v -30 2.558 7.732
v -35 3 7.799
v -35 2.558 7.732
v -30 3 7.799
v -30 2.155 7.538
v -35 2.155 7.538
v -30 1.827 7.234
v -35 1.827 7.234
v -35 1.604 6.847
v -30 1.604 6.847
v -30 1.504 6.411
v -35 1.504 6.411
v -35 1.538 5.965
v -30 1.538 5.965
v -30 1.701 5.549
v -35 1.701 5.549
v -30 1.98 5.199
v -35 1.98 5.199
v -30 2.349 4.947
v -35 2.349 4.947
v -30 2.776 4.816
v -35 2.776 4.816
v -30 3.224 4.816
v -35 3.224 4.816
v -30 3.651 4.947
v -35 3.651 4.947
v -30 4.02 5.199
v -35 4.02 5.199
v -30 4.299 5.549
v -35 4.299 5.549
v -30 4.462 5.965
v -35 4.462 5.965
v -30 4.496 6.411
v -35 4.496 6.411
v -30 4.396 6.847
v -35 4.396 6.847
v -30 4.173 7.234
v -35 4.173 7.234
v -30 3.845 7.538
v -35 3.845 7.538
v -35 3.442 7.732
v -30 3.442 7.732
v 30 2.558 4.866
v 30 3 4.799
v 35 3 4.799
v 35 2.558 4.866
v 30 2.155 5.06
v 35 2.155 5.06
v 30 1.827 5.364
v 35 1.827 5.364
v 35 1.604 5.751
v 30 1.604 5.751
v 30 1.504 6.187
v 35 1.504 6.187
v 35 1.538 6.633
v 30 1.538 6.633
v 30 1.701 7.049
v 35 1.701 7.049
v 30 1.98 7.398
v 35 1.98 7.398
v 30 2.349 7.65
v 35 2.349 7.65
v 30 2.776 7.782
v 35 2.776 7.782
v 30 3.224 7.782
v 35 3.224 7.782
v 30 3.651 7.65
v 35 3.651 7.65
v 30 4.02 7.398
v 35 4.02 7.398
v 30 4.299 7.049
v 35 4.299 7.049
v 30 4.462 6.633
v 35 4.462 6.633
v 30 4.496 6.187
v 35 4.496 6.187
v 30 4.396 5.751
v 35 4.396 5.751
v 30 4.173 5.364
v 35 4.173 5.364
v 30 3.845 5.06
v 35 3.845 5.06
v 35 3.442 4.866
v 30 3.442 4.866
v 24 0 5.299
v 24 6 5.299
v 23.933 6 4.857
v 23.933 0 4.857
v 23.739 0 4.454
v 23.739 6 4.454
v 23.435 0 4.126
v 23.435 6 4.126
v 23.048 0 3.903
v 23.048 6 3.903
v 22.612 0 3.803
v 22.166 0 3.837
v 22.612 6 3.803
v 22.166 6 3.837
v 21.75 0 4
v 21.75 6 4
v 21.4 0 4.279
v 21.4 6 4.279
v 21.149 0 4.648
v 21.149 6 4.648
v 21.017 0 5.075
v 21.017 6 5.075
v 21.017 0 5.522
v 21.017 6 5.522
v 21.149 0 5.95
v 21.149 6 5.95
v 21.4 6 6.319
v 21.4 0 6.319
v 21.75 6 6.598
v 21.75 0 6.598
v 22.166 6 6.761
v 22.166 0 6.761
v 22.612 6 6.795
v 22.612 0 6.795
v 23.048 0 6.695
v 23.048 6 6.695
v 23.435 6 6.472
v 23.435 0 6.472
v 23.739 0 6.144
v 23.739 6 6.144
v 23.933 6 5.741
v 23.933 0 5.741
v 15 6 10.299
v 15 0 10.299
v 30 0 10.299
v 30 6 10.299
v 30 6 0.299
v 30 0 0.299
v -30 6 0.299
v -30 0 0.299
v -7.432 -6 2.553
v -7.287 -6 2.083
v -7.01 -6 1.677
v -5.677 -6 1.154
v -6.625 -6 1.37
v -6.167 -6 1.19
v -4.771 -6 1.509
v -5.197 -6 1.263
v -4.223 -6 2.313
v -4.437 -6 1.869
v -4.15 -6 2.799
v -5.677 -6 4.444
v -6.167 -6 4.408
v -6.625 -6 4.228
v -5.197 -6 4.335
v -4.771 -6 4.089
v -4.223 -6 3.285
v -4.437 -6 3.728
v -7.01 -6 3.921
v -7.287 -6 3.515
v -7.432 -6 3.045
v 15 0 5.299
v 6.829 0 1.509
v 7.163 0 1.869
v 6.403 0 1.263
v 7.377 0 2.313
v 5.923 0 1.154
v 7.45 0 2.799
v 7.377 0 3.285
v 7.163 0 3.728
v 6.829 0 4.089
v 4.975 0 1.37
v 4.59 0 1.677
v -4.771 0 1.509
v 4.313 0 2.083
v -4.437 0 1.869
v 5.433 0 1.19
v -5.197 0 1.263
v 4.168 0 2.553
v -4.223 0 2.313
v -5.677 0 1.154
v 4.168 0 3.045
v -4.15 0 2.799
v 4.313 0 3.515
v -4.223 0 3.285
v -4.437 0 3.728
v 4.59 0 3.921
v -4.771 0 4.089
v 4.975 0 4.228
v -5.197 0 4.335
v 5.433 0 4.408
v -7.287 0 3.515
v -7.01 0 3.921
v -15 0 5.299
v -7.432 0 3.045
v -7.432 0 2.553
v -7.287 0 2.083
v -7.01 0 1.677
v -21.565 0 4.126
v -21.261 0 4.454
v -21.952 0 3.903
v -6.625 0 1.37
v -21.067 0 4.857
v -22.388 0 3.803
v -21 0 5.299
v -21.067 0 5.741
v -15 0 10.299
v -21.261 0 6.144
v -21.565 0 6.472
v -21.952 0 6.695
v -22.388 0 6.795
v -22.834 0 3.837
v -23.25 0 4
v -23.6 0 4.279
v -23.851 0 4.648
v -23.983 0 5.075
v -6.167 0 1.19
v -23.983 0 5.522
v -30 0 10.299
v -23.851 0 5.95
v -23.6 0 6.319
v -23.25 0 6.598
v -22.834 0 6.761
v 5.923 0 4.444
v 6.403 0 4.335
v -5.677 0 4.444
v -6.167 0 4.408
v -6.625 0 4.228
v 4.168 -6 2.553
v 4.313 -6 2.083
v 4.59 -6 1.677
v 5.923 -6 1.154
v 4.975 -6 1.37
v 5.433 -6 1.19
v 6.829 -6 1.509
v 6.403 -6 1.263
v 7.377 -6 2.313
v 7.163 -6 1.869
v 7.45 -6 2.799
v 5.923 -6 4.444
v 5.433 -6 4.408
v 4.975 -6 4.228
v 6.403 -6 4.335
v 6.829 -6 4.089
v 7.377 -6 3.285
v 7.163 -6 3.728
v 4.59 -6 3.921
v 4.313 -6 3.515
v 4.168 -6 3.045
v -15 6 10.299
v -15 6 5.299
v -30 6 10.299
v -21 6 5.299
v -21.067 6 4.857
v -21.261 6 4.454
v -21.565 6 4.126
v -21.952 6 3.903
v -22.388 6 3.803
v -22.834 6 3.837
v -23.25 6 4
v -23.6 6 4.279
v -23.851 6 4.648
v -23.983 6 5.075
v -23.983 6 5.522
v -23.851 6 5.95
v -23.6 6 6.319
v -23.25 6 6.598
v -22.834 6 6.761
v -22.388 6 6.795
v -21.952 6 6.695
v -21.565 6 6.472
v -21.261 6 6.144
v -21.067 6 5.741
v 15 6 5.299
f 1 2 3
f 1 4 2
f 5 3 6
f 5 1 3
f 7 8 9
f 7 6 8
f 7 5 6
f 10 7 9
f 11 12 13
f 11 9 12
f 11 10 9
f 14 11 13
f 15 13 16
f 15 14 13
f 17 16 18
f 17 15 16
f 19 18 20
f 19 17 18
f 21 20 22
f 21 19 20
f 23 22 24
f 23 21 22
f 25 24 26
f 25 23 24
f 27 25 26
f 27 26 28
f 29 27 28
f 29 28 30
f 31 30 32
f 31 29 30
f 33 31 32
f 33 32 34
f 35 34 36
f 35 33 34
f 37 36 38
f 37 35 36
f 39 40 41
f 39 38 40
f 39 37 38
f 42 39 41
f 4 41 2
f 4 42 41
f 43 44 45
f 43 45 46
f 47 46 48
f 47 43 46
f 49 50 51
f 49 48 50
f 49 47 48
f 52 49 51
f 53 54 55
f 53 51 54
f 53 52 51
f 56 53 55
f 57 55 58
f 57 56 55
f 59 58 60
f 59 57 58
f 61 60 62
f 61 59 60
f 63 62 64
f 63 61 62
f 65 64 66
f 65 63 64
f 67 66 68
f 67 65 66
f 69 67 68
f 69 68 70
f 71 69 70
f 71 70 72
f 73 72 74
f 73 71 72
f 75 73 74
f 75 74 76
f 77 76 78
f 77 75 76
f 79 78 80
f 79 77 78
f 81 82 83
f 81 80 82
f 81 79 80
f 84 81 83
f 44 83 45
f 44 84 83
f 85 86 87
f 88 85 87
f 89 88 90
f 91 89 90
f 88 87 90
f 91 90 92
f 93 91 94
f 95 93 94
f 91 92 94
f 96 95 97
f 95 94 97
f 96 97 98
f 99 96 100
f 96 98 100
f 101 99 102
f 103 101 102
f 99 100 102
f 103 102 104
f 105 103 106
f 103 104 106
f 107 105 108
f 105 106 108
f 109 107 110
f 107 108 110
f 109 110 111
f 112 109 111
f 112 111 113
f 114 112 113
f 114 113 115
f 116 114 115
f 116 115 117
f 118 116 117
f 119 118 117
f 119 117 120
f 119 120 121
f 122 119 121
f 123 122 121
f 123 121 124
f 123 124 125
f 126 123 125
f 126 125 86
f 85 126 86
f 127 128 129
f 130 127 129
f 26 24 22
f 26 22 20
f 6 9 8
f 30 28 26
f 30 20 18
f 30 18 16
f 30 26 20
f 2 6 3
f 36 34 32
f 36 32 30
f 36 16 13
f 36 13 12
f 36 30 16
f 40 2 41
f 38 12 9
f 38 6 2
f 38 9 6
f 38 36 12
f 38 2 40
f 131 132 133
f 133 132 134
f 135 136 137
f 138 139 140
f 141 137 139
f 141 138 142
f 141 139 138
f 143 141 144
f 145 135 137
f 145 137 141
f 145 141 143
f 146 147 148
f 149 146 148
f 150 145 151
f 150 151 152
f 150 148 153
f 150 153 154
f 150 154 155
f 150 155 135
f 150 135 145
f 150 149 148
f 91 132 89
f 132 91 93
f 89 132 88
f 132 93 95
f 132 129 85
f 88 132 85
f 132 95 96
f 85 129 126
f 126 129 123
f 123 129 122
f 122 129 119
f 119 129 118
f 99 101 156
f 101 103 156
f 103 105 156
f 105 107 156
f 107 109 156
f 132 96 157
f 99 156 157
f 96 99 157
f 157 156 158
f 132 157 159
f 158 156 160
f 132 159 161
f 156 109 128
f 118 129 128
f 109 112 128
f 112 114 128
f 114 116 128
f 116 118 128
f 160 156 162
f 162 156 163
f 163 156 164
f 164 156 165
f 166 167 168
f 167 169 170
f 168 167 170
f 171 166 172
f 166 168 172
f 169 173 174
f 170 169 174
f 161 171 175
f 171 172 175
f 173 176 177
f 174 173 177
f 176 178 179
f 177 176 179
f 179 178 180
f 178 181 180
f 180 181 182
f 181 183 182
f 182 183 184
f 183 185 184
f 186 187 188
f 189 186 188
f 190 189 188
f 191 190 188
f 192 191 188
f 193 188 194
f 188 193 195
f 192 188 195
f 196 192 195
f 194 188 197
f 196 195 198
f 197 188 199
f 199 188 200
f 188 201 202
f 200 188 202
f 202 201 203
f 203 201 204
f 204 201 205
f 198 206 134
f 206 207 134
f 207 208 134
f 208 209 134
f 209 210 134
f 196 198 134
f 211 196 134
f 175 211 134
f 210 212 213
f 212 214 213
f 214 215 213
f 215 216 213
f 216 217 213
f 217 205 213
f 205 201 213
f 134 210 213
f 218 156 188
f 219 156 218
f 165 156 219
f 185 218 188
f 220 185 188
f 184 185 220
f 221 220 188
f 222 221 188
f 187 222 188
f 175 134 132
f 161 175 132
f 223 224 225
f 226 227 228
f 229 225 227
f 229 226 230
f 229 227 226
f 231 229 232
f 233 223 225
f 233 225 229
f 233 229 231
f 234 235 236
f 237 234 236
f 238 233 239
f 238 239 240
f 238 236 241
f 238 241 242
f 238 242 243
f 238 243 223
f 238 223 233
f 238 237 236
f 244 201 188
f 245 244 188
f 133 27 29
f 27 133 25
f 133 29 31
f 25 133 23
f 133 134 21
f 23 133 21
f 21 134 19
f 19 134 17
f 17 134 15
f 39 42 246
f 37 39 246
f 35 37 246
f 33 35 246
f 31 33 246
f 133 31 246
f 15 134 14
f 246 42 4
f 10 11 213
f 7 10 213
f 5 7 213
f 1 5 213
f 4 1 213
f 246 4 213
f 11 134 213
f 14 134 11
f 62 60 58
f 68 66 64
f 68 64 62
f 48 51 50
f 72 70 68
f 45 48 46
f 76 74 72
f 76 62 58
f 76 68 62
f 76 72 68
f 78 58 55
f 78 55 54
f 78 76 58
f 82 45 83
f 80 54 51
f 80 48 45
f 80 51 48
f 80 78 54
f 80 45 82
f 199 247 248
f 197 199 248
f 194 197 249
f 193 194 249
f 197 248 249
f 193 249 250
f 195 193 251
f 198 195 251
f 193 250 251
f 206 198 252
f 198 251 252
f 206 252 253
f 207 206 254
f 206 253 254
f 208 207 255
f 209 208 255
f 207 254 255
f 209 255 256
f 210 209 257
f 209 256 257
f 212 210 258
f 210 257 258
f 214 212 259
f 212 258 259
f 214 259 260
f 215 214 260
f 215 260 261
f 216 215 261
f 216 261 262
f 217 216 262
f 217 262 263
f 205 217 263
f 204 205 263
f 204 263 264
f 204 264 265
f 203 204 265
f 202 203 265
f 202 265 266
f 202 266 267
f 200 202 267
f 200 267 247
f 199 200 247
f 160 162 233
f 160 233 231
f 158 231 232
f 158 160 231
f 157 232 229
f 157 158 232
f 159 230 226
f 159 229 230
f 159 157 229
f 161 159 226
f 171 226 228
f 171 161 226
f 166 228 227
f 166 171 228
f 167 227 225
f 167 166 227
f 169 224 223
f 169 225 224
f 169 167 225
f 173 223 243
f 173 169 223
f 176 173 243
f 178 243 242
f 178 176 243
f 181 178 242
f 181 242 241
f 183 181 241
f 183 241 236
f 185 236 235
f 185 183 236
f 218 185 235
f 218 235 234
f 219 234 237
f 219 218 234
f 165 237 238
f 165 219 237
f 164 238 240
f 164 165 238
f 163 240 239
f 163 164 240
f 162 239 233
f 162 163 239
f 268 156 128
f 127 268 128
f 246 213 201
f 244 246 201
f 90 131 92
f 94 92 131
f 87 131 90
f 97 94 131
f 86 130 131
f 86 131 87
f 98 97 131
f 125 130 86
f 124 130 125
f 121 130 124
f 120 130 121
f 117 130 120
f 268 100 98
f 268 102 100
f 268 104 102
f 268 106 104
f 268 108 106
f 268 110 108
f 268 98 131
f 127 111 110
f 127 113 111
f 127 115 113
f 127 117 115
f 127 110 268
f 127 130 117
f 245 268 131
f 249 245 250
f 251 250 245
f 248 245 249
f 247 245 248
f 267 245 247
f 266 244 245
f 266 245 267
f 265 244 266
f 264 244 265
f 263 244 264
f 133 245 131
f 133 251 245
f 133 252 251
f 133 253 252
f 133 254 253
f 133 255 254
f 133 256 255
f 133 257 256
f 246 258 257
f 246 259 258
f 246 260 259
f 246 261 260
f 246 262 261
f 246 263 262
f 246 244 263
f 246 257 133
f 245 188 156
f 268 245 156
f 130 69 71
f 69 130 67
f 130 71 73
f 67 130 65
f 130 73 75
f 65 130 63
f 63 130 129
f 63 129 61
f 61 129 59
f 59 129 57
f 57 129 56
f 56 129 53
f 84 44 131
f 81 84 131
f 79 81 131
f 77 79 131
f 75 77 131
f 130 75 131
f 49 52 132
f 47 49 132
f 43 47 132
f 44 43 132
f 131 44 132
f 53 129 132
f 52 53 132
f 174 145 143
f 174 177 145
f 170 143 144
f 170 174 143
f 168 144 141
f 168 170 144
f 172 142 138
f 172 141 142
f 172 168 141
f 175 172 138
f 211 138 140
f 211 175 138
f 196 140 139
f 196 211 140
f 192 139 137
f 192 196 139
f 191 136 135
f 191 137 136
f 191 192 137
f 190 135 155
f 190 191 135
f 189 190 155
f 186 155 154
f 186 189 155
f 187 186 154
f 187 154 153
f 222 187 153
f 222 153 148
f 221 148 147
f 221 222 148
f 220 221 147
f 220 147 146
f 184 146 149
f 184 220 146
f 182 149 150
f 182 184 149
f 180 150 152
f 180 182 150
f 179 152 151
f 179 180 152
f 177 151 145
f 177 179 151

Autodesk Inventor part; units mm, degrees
ref_plane "YZ Plane" through (0, 0, 0) normal (1, 0, 0) x (0, 1, 0)
ref_plane "XZ Plane" through (0, 0, 0) normal (0, 1, 0) x (-1, 0, 0)
ref_plane "XY Plane" through (0, 0, 0) normal (0, 0, 1) x (1, 0, 0)
sketch "Skizze1" plane through (0, 0, 0) normal (0, 1, 0) x (-1, 0, 0)
  line L0 (30, 0.2989) -> (30, 10.2989)
  line L1 (30, 10.2989) -> (15, 10.2989)
  line L2 (15, 10.2989) -> (15, 5.2989)
  line L3 (15, 5.2989) -> (-15, 5.2989)
  line L4 (-15, 5.2989) -> (-15, 10.2989)
  line L5 (-15, 10.2989) -> (-30, 10.2989)
  line L6 (-30, 10.2989) -> (-30, 0.2989)
  line L7 (-30, 0.2989) -> (30, 0.2989)
  line L8 (0, -2.0598) -> (0, 12.3587) projected
  point P0 (0, 0)
  dimension "d0" = 30
  dimension "d1" = 5
  dimension "d2" = 15
  dimension "d3" = 15
  dimension "d4" = 15
  dimension "d5" = 5
extrude "Extrusion1" add sketch "Skizze1" along normal blind 6
sketch "Skizze2" plane through (30, 0, 10.2989) normal (1, 0, 0) x (0, 0, -1)
  circle A0 centre (4, 3) radius 1.5
  line L0 (0, 0) -> (0, 6) projected
  line L1 (0, 6) -> (10, 6) projected
  point P0 (10.2989, 0)
  dimension "d8" = 3
  dimension "d9" = 4
  dimension "d10" = 3
extrude "Extrusion2" add sketch "Skizze2" along normal blind 5
sketch "Skizze4" plane through (-30, 0, 0.2989) normal (-1, 0, 0) x (0, 0, 1)
  circle A0 centre (6, 3) radius 1.5 projected
  circle A1 centre (6, 3) radius 1.5
  line L0 (10, 0) -> (10, 6) projected
  line L1 (0, 0) -> (10, 0) projected
  point P0 (-0.2989, 0)
  dimension "d21" = 4
  dimension "d22" = 3
extrude "Extrusion4" add sketch "Skizze4" along normal blind 5
sketch "Skizze5" plane through (0, 6, 0) normal (0, 1, 0) x (1, 0, 0)
  circle A0 centre (-22.5, -5.2989) radius 1.5
  circle A1 centre (22.5, -5.2989) radius 1.5
  line L0 (-30, -10.2989) -> (-15, -10.2989) projected
  line L1 (-30, -0.2989) -> (-30, -10.2989) projected
  line L2 (30, -10.2989) -> (30, -0.2989) projected
  line L3 (15, -10.2989) -> (30, -10.2989) projected
  point P0 (0, 0)
  dimension "d25" = 5
  dimension "d26" = 7.5
  dimension "d27" = 7.5
  dimension "d28" = 5
  dimension "d29" = 3
  dimension "d30" = 3
extrude "Extrusion5" cut sketch "Skizze5" against normal blind 6
sketch "Skizze6" plane through (0, 0, 0) normal (0, -1, 0) x (1, 0, 0)
  circle A0 centre (-5.8, 2.7989) radius 1.65
  circle A1 centre (5.8, 2.7989) radius 1.65
  line L0 (-30, 0.2989) -> (-30, 10.2989) projected
  line L1 (-30, 10.2989) -> (-15, 10.2989) projected
  line L2 (15, 10.2989) -> (30, 10.2989) projected
  line L3 (30, 10.2989) -> (30, 0.2989) projected
  point P0 (0, 0)
  dimension "d33" = 3.3
  dimension "d34" = 3.3
  dimension "d36" = 7.5
  dimension "d37" = 7.5
  dimension "d41" = 5.8
  dimension "d42" = 5.8
extrude "Extrusion6" add sketch "Skizze6" along normal blind 6
equation "\"d2\" = 0.5 * d0"
properties part number "Fuehrungslagerhalter_v1"
